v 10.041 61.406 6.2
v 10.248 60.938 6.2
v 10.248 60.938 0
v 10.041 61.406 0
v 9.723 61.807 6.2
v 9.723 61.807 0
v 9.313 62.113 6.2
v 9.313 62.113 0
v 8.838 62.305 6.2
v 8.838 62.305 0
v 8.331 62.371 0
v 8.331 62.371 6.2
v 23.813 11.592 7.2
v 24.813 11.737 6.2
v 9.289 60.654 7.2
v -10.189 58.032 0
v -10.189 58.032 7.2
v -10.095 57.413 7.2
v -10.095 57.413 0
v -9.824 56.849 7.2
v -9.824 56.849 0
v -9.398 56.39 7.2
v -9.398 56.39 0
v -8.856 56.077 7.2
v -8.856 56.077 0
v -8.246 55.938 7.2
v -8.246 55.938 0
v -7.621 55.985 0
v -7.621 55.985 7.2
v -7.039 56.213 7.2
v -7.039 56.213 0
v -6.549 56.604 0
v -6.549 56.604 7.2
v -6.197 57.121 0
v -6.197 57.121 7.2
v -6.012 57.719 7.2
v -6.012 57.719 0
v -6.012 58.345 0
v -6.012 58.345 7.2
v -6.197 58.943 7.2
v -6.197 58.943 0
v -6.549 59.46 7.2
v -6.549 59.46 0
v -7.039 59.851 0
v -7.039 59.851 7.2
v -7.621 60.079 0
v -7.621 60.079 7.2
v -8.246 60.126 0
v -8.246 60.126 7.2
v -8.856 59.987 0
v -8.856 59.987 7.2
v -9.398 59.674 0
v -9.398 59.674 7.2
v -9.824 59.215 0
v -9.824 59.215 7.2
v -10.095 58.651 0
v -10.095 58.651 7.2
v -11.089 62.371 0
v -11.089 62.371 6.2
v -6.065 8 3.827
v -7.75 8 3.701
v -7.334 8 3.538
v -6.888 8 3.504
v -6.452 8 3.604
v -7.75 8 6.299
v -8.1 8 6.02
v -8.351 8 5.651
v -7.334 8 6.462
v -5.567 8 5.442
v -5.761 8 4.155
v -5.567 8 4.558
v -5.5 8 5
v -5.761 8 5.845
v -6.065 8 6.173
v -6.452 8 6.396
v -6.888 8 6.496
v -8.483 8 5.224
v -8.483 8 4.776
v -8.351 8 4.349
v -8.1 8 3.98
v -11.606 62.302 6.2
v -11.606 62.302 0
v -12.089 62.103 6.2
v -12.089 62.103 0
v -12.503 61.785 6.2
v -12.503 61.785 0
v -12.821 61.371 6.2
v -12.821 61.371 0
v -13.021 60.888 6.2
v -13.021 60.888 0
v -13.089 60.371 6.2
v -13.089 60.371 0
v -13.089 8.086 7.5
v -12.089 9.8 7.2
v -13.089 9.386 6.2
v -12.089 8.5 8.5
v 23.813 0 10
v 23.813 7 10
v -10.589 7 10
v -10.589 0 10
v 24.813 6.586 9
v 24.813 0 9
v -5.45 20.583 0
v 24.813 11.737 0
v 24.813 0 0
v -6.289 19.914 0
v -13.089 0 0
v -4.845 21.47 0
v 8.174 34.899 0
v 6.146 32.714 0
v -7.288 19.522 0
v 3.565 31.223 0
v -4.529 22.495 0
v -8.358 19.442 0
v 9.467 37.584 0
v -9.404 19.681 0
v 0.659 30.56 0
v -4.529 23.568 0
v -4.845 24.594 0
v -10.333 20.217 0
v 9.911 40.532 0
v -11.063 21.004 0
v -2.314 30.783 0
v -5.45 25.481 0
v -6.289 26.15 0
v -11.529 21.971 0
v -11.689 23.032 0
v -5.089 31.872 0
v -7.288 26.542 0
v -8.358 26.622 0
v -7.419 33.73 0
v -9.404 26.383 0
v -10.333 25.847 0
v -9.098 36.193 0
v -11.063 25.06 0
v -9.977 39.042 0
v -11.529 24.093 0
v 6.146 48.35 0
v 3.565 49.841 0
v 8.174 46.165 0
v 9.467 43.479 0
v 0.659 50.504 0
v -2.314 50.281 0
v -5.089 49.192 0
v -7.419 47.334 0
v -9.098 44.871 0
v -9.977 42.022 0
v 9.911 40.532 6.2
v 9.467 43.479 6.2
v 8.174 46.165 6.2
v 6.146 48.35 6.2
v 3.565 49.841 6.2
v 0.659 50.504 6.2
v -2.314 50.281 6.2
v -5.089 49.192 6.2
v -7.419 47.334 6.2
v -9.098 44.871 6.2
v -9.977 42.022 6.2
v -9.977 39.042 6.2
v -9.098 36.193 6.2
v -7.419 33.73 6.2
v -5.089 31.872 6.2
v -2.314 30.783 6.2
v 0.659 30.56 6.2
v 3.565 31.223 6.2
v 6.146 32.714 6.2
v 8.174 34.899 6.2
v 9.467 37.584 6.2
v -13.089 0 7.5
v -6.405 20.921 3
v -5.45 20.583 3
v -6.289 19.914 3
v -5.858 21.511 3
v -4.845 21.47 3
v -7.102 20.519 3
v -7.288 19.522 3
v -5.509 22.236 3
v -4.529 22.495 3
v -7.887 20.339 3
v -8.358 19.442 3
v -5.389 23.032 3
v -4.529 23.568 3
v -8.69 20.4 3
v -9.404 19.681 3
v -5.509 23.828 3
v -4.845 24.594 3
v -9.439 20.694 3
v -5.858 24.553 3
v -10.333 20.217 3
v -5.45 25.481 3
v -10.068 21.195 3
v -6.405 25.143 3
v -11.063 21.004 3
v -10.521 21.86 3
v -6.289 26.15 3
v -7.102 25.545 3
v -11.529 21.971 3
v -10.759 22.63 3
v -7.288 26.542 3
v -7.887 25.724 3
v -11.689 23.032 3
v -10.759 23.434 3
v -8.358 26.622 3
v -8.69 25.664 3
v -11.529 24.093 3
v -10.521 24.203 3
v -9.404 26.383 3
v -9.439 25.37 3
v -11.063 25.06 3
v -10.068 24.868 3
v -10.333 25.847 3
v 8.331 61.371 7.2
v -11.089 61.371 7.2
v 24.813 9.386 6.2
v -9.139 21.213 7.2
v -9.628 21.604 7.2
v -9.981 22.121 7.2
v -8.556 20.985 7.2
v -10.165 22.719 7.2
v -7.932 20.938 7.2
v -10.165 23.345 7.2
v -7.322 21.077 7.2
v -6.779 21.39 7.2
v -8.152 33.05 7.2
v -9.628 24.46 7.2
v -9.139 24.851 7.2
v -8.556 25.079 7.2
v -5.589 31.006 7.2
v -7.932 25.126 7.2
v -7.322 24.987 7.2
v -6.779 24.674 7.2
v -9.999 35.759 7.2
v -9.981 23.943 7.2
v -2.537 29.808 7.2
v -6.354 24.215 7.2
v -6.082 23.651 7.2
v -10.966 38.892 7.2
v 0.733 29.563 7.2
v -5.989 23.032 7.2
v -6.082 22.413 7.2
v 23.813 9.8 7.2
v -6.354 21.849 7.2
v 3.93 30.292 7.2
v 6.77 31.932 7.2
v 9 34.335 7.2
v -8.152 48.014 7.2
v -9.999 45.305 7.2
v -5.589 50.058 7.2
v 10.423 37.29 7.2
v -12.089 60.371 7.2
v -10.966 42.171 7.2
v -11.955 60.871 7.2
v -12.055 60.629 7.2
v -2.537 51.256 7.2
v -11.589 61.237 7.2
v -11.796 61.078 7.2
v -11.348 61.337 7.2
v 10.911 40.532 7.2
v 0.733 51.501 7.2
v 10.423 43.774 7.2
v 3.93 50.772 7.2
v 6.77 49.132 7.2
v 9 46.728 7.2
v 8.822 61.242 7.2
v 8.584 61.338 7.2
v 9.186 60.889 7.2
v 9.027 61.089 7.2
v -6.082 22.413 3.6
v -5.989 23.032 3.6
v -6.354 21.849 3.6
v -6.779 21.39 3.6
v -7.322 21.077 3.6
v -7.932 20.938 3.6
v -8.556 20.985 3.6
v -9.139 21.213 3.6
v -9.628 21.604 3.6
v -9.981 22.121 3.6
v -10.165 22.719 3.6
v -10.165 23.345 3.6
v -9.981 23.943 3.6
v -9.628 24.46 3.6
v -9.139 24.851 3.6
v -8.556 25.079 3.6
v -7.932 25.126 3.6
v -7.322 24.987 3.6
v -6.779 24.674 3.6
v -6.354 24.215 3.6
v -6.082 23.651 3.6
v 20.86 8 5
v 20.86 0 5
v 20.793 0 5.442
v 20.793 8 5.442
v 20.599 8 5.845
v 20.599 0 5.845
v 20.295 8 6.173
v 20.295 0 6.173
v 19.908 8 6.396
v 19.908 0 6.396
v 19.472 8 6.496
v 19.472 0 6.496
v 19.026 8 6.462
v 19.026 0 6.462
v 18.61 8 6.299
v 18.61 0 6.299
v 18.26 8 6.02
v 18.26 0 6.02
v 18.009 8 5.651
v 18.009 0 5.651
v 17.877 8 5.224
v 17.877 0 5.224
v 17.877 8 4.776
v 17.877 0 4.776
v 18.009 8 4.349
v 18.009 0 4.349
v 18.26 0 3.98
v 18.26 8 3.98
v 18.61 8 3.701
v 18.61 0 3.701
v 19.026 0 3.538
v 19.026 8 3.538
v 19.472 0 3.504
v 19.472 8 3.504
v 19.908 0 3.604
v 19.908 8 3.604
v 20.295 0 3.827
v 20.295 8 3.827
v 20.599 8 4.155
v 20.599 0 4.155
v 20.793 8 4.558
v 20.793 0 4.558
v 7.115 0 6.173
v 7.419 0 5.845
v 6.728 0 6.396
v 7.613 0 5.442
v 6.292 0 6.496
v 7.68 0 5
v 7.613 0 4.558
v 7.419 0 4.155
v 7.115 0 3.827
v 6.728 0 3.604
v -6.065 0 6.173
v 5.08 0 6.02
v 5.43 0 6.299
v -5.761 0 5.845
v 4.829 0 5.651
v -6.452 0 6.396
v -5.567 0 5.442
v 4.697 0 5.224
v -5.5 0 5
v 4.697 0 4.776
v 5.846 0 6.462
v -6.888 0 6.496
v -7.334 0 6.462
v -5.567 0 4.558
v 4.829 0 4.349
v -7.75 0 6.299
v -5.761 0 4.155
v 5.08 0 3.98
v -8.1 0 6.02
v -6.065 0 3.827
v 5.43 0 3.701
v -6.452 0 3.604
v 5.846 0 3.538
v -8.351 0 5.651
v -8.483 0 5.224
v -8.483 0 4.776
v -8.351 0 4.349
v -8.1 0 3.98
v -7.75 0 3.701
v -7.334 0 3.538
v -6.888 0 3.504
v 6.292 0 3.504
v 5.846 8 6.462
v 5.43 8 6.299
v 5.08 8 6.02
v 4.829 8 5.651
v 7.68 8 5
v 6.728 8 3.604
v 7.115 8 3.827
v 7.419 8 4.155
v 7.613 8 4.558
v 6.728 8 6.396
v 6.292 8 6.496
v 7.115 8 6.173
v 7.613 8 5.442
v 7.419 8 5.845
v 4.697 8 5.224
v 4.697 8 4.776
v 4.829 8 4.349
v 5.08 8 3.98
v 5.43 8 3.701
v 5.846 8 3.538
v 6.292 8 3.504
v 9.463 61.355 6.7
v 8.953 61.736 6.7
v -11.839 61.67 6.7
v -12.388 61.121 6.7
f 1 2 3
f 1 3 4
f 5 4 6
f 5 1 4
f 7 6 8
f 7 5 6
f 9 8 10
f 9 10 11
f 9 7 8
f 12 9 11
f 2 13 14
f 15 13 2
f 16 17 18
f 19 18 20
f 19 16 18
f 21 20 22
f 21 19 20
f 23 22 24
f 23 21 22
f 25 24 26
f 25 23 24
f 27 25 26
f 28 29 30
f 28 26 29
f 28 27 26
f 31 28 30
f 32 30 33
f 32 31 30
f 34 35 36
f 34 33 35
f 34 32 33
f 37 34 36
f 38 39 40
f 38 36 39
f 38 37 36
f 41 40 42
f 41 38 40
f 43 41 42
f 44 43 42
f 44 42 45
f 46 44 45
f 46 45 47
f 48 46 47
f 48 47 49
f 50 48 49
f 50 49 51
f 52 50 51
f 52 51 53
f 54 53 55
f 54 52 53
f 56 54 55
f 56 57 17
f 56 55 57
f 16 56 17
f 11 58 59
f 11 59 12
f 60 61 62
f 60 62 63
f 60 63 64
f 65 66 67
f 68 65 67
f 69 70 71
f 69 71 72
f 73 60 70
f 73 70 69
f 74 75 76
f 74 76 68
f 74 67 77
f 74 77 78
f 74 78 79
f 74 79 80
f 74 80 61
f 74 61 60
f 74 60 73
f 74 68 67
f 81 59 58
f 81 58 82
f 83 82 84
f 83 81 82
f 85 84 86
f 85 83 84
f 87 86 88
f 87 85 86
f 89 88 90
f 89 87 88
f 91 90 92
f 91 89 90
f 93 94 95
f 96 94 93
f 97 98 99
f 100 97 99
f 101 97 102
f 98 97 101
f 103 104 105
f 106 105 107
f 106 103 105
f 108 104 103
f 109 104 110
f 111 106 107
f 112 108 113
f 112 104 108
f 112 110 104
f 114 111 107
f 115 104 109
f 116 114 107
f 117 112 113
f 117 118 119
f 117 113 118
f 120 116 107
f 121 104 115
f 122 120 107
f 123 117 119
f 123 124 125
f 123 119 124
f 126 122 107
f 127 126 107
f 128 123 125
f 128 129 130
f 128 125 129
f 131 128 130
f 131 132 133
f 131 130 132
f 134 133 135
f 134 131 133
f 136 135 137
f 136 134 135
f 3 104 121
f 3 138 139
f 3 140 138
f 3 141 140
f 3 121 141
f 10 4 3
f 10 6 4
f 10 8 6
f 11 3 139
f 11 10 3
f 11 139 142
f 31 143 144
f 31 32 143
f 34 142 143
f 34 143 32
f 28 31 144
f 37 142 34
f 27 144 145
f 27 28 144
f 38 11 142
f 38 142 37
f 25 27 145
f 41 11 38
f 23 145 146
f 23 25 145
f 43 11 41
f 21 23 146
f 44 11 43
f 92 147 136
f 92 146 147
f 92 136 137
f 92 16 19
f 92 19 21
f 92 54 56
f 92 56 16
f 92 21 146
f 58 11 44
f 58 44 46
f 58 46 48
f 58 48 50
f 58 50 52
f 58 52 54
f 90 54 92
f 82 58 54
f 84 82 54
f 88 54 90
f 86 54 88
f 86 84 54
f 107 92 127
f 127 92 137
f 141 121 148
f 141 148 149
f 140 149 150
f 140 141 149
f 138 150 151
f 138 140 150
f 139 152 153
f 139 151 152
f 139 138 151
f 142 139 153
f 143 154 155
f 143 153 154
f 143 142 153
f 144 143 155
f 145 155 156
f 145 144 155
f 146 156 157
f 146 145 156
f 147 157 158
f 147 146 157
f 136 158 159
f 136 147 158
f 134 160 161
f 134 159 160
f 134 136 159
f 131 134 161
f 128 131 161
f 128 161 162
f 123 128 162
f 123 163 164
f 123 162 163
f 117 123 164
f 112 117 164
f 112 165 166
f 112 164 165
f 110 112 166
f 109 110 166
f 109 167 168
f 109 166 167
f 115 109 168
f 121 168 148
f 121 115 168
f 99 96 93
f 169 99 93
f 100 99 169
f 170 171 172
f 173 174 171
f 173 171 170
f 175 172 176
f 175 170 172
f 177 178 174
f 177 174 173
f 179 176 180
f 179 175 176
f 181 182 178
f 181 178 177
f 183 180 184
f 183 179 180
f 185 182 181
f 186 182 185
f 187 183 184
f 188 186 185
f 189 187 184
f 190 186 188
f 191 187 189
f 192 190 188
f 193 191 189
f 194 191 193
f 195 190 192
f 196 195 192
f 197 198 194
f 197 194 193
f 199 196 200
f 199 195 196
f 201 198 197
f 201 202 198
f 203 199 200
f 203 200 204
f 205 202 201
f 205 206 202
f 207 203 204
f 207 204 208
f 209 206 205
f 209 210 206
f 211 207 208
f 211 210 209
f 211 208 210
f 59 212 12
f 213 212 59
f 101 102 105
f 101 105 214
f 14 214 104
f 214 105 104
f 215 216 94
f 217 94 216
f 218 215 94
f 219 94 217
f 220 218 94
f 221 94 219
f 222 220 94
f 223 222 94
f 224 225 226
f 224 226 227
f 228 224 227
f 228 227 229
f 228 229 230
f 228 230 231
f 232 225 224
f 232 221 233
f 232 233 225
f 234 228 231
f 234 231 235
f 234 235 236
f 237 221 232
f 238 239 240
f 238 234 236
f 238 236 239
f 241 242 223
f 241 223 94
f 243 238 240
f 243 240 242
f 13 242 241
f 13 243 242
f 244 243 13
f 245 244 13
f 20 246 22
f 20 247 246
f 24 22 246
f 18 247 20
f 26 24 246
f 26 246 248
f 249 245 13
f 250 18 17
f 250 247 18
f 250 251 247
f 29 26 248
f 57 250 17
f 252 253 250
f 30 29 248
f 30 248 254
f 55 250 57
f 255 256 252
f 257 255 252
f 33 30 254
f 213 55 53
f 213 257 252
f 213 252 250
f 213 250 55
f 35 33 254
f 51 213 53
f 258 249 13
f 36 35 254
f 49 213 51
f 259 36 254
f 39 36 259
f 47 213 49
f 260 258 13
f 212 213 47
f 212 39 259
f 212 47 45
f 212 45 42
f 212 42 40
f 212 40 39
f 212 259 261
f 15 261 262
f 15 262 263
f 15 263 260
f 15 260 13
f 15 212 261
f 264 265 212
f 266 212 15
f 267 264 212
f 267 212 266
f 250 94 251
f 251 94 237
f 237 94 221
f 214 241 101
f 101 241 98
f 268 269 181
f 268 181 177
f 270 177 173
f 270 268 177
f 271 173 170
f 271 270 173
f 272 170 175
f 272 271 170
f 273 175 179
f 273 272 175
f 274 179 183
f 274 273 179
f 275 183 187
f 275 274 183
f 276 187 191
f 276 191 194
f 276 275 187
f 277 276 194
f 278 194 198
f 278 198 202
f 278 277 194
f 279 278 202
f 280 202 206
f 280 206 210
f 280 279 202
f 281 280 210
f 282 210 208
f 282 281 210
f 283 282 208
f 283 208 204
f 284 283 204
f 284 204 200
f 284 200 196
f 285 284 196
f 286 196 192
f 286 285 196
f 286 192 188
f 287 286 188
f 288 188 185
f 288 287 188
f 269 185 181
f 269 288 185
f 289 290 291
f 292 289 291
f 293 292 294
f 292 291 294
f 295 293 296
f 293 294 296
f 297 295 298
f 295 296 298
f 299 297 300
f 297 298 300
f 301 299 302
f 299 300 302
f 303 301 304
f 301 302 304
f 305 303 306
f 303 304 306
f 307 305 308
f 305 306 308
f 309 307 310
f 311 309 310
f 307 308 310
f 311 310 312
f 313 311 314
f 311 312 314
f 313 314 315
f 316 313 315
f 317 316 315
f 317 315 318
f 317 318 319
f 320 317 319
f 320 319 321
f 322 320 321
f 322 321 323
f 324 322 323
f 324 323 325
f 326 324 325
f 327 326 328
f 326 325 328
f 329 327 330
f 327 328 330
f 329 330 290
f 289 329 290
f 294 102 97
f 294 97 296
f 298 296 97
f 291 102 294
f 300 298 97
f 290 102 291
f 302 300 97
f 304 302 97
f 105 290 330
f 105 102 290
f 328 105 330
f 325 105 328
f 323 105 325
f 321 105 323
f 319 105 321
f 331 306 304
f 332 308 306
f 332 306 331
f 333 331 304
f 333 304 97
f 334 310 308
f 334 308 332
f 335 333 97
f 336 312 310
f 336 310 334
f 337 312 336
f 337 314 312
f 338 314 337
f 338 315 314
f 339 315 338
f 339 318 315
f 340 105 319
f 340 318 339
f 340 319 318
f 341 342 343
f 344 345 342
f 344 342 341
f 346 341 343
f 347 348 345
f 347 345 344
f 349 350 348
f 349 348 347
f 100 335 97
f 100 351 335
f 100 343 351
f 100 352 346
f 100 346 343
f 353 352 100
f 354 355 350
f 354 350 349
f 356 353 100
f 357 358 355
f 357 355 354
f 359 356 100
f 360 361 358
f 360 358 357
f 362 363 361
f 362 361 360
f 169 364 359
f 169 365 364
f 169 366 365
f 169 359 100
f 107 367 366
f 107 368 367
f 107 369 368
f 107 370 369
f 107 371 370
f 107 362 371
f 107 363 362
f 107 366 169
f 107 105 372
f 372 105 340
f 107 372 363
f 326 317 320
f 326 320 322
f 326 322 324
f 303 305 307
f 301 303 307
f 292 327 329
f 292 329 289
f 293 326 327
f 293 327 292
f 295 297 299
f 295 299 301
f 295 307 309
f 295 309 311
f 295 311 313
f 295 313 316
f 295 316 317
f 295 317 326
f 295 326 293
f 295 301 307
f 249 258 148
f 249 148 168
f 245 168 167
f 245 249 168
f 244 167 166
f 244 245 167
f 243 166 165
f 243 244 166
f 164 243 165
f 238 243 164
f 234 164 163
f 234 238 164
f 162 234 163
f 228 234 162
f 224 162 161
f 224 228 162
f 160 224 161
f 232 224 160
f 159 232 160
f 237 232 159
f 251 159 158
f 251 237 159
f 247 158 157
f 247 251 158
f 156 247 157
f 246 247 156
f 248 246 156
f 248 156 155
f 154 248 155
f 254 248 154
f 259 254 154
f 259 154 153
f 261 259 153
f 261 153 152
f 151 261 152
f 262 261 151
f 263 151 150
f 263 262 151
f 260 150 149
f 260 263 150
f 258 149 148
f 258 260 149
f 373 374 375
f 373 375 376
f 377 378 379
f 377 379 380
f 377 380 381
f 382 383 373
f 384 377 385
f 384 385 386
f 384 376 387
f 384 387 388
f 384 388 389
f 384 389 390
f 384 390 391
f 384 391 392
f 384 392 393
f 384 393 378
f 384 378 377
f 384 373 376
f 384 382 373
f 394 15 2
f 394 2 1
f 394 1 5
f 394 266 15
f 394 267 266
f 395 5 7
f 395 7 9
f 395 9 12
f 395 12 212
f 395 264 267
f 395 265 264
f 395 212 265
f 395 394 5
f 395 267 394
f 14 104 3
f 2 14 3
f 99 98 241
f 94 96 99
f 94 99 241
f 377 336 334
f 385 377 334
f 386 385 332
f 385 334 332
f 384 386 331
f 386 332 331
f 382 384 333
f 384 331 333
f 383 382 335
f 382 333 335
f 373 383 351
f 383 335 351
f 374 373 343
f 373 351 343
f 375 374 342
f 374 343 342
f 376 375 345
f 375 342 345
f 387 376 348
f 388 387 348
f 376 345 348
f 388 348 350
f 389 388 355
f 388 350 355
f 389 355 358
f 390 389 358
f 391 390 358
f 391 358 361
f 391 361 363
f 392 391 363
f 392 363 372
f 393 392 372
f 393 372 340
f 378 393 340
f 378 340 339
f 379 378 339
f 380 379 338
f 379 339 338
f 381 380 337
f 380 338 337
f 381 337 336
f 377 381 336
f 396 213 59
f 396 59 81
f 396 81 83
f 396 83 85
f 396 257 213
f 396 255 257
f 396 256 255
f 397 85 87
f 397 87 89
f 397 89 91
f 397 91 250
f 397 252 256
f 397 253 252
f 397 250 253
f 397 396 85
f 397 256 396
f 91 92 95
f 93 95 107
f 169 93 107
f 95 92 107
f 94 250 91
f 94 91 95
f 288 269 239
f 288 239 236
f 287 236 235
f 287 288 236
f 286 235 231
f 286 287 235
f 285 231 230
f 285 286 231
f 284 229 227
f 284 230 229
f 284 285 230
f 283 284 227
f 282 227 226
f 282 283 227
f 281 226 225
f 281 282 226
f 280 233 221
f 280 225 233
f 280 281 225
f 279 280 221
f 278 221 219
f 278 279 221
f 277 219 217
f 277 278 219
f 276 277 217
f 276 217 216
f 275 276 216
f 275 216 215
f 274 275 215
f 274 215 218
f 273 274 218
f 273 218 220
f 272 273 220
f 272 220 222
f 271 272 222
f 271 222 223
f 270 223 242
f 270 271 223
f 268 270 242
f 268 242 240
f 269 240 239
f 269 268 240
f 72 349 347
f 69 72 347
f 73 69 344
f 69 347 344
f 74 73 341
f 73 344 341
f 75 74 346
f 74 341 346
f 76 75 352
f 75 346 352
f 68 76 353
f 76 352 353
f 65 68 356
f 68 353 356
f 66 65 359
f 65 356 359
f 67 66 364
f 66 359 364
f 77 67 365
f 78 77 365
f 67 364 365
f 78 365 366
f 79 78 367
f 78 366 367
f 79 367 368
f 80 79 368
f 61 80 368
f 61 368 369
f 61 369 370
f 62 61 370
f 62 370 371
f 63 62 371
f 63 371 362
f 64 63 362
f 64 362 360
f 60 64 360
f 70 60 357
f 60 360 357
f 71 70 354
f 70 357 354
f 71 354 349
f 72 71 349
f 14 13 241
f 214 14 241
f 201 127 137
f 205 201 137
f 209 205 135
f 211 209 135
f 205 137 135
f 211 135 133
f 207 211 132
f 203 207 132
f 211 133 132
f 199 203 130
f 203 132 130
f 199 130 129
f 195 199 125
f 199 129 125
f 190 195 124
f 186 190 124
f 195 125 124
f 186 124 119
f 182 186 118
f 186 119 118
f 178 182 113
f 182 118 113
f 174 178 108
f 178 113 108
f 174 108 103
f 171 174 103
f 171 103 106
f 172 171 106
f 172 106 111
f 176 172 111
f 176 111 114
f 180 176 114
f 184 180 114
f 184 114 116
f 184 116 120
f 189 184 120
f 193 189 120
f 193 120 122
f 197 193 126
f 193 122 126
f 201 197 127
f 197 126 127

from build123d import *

# Parameters (mm, degrees)
SKIZZE1_R                            = 2.1
AUFSATZ_LINEAR_AUSTRAGEN1_DEPTH      = 10
SKIZZE2_R                            = 1.5
SCHNITT_LINEAR_AUSTRAGEN1_DEPTH      = 8
SCHNITT_LINEAR_AUSTRAGEN3_DEPTH      = 2.8
SCHNITT_LINEAR_AUSTRAGEN5_DEPTH      = 69.862823313
SCHNITT_LINEAR_AUSTRAGEN5_DEPTH_BACK = 69.862823313
SKIZZE7_R                            = 10
FASE1_SIZE                           = 3
SCHNITT_LINEAR_AUSTRAGEN4_DEPTH      = 10
VERRUNDUNG1_R                        = 2
FASE2_SIZE                           = 1
FASE3_SIZE                           = 2.5
SKIZZE8_R                            = 3.6
SCHNITT_LINEAR_AUSTRAGEN6_DEPTH      = 3
FASE4_SIZE                           = 0.6


with BuildPart() as part:
    # Skizze1 → Aufsatz-Linear austragen1 (new body)
    with BuildSketch(Plane.XY):
        Polygon((28.287001282, 57.370618027), (28.287001282, 0), (-13.088781156, 0), (-13.088781156, 27.348243657), (-13.088781156, 53.715647777), (-13.088781156, 57.370618027), (-13.088781156, 62.370618027), (28.287001282, 62.370618027), align=None)
        with Locations((-8.088781156, 23.031945717)):
            Circle(SKIZZE1_R, mode=Mode.SUBTRACT)
        with Locations(Location((-8.088781156, 58.031945717, 0), (0, 0, 180))):
            Circle(SKIZZE1_R, mode=Mode.SUBTRACT)
    extrude(amount=AUFSATZ_LINEAR_AUSTRAGEN1_DEPTH)

    # Skizze2 → Schnitt-Linear austragen1 (cut)
    with BuildSketch(Plane.XZ):
        with Locations((-7, 5)):
            Circle(SKIZZE2_R)
        with Locations((6.18, 5)):
            Circle(SKIZZE2_R)
        with Locations((19.36, 5)):
            Circle(SKIZZE2_R)
    extrude(amount=-SCHNITT_LINEAR_AUSTRAGEN1_DEPTH, mode=Mode.SUBTRACT)

    # Skizze4 → Schnitt-Linear austragen3 (cut)
    with BuildSketch(Plane.XY.offset(10)):
        Polygon((-15.095168359, 10), (28.287001282, 10), (36.093332102, 46.989971623), (30.429094825, 65.957451721), (-16.081030445, 65.957451721), (-16.081030445, 27.753515123), align=None)
    extrude(amount=-SCHNITT_LINEAR_AUSTRAGEN3_DEPTH, mode=Mode.SUBTRACT)

    # Skizze7 → Schnitt-Linear austragen5 (cut, two sides: drawn at the far end of the back side and taken through both)
    with BuildSketch(Plane.XY.offset(7.2).offset(-SCHNITT_LINEAR_AUSTRAGEN5_DEPTH_BACK)):
        with Locations((-0.088781156, 40.531945717)):
            Circle(SKIZZE7_R)
    extrude(amount=SCHNITT_LINEAR_AUSTRAGEN5_DEPTH + SCHNITT_LINEAR_AUSTRAGEN5_DEPTH_BACK, mode=Mode.SUBTRACT)

    # Fase1
    # the kernel refuses this chamfer: 3 mm, written as the material it takes off along each edge
    with BuildSketch(Plane(origin=(-20.80383012, 10, 10), x_dir=(0, -0.9996219169112969, 0.027495876610586202), z_dir=(1, 0, 0))) as fase1_piece_1_section:
        Polygon((FASE1_SIZE * 0.999621916911, FASE1_SIZE * 0.0274958766106), (-FASE1_SIZE * 0.0274958766106, FASE1_SIZE * 0.999621916911), (0, 0), align=None)
    fase1_piece_1 = extrude(amount=56.805880365, mode=Mode.PRIVATE)
    fase1_piece_1 = split(fase1_piece_1, bisect_by=Plane(origin=(7.599110063, 8.999392985, 7.2), z_dir=(0, 0, 1)), keep=Keep.TOP, mode=Mode.PRIVATE)
    add(fase1_piece_1, mode=Mode.SUBTRACT)

    # Skizze5 → Schnitt-Linear austragen4 (cut)
    with BuildSketch(Plane(origin=(0, 0, 0), x_dir=(-1, 0, 0), z_dir=(0, 0, -1))):
        Polygon((-24.81273389, 11.736777957), (-9.824335871, 62.370618027), (-28.287001282, 62.370618027), (-28.287001282, 0), (-24.81273389, 0), align=None)
    extrude(amount=-SCHNITT_LINEAR_AUSTRAGEN4_DEPTH, mode=Mode.SUBTRACT)

    # Verrundung1
    verrundung1_edges = [part.edges().sort_by_distance(p)[0] for p in [
        (9.824335871, 62.370618027, 3.6),
        (-13.088781156, 62.370618027, 3.6),
    ]]
    fillet(verrundung1_edges, radius=VERRUNDUNG1_R)

    # Fase2
    fase2_edges = [part.edges().sort_by_distance(p)[0] for p in [
        (24.81273389, 10.768388979, 7.2),
        (24.81273389, 3.5, 10),
        (-13.088781156, 35.085309014, 7.2),
        (-1.379099888, 62.370618027, 7.2),
        (17.530529072, 36.337538735, 7.2),
        (9.527376482, 61.973016693, 7.2),
        (-12.502994718, 61.78483159, 7.2),
        (-10.088781156, 40.531945717, 7.2),
        (-13.088781156, 8.4, 8.6),
        (24.81273389, 8.4, 8.6),
    ]]
    chamfer(fase2_edges, length=FASE2_SIZE)

    # Fase3
    fase3_edges = [part.edges().sort_by_distance(p)[0] for p in [
        (-13.088781156, 2.792893219, 10),
    ]]
    chamfer(fase3_edges, length=FASE3_SIZE)

    # Skizze8 → Schnitt-Linear austragen6 (cut)
    with BuildSketch(Plane(origin=(0, 0, 0), x_dir=(-1, 0, 0), z_dir=(0, 0, -1))):
        with Locations((8.088781156, 23.031945717)):
            Circle(SKIZZE8_R)
    extrude(amount=-SCHNITT_LINEAR_AUSTRAGEN6_DEPTH, mode=Mode.SUBTRACT)

    # Fase4
    fase4_edges = [part.edges().sort_by_distance(p)[0] for p in [
        (-10.188781156, 23.031945717, 3),
    ]]
    chamfer(fase4_edges, length=FASE4_SIZE)


solid = part.part
